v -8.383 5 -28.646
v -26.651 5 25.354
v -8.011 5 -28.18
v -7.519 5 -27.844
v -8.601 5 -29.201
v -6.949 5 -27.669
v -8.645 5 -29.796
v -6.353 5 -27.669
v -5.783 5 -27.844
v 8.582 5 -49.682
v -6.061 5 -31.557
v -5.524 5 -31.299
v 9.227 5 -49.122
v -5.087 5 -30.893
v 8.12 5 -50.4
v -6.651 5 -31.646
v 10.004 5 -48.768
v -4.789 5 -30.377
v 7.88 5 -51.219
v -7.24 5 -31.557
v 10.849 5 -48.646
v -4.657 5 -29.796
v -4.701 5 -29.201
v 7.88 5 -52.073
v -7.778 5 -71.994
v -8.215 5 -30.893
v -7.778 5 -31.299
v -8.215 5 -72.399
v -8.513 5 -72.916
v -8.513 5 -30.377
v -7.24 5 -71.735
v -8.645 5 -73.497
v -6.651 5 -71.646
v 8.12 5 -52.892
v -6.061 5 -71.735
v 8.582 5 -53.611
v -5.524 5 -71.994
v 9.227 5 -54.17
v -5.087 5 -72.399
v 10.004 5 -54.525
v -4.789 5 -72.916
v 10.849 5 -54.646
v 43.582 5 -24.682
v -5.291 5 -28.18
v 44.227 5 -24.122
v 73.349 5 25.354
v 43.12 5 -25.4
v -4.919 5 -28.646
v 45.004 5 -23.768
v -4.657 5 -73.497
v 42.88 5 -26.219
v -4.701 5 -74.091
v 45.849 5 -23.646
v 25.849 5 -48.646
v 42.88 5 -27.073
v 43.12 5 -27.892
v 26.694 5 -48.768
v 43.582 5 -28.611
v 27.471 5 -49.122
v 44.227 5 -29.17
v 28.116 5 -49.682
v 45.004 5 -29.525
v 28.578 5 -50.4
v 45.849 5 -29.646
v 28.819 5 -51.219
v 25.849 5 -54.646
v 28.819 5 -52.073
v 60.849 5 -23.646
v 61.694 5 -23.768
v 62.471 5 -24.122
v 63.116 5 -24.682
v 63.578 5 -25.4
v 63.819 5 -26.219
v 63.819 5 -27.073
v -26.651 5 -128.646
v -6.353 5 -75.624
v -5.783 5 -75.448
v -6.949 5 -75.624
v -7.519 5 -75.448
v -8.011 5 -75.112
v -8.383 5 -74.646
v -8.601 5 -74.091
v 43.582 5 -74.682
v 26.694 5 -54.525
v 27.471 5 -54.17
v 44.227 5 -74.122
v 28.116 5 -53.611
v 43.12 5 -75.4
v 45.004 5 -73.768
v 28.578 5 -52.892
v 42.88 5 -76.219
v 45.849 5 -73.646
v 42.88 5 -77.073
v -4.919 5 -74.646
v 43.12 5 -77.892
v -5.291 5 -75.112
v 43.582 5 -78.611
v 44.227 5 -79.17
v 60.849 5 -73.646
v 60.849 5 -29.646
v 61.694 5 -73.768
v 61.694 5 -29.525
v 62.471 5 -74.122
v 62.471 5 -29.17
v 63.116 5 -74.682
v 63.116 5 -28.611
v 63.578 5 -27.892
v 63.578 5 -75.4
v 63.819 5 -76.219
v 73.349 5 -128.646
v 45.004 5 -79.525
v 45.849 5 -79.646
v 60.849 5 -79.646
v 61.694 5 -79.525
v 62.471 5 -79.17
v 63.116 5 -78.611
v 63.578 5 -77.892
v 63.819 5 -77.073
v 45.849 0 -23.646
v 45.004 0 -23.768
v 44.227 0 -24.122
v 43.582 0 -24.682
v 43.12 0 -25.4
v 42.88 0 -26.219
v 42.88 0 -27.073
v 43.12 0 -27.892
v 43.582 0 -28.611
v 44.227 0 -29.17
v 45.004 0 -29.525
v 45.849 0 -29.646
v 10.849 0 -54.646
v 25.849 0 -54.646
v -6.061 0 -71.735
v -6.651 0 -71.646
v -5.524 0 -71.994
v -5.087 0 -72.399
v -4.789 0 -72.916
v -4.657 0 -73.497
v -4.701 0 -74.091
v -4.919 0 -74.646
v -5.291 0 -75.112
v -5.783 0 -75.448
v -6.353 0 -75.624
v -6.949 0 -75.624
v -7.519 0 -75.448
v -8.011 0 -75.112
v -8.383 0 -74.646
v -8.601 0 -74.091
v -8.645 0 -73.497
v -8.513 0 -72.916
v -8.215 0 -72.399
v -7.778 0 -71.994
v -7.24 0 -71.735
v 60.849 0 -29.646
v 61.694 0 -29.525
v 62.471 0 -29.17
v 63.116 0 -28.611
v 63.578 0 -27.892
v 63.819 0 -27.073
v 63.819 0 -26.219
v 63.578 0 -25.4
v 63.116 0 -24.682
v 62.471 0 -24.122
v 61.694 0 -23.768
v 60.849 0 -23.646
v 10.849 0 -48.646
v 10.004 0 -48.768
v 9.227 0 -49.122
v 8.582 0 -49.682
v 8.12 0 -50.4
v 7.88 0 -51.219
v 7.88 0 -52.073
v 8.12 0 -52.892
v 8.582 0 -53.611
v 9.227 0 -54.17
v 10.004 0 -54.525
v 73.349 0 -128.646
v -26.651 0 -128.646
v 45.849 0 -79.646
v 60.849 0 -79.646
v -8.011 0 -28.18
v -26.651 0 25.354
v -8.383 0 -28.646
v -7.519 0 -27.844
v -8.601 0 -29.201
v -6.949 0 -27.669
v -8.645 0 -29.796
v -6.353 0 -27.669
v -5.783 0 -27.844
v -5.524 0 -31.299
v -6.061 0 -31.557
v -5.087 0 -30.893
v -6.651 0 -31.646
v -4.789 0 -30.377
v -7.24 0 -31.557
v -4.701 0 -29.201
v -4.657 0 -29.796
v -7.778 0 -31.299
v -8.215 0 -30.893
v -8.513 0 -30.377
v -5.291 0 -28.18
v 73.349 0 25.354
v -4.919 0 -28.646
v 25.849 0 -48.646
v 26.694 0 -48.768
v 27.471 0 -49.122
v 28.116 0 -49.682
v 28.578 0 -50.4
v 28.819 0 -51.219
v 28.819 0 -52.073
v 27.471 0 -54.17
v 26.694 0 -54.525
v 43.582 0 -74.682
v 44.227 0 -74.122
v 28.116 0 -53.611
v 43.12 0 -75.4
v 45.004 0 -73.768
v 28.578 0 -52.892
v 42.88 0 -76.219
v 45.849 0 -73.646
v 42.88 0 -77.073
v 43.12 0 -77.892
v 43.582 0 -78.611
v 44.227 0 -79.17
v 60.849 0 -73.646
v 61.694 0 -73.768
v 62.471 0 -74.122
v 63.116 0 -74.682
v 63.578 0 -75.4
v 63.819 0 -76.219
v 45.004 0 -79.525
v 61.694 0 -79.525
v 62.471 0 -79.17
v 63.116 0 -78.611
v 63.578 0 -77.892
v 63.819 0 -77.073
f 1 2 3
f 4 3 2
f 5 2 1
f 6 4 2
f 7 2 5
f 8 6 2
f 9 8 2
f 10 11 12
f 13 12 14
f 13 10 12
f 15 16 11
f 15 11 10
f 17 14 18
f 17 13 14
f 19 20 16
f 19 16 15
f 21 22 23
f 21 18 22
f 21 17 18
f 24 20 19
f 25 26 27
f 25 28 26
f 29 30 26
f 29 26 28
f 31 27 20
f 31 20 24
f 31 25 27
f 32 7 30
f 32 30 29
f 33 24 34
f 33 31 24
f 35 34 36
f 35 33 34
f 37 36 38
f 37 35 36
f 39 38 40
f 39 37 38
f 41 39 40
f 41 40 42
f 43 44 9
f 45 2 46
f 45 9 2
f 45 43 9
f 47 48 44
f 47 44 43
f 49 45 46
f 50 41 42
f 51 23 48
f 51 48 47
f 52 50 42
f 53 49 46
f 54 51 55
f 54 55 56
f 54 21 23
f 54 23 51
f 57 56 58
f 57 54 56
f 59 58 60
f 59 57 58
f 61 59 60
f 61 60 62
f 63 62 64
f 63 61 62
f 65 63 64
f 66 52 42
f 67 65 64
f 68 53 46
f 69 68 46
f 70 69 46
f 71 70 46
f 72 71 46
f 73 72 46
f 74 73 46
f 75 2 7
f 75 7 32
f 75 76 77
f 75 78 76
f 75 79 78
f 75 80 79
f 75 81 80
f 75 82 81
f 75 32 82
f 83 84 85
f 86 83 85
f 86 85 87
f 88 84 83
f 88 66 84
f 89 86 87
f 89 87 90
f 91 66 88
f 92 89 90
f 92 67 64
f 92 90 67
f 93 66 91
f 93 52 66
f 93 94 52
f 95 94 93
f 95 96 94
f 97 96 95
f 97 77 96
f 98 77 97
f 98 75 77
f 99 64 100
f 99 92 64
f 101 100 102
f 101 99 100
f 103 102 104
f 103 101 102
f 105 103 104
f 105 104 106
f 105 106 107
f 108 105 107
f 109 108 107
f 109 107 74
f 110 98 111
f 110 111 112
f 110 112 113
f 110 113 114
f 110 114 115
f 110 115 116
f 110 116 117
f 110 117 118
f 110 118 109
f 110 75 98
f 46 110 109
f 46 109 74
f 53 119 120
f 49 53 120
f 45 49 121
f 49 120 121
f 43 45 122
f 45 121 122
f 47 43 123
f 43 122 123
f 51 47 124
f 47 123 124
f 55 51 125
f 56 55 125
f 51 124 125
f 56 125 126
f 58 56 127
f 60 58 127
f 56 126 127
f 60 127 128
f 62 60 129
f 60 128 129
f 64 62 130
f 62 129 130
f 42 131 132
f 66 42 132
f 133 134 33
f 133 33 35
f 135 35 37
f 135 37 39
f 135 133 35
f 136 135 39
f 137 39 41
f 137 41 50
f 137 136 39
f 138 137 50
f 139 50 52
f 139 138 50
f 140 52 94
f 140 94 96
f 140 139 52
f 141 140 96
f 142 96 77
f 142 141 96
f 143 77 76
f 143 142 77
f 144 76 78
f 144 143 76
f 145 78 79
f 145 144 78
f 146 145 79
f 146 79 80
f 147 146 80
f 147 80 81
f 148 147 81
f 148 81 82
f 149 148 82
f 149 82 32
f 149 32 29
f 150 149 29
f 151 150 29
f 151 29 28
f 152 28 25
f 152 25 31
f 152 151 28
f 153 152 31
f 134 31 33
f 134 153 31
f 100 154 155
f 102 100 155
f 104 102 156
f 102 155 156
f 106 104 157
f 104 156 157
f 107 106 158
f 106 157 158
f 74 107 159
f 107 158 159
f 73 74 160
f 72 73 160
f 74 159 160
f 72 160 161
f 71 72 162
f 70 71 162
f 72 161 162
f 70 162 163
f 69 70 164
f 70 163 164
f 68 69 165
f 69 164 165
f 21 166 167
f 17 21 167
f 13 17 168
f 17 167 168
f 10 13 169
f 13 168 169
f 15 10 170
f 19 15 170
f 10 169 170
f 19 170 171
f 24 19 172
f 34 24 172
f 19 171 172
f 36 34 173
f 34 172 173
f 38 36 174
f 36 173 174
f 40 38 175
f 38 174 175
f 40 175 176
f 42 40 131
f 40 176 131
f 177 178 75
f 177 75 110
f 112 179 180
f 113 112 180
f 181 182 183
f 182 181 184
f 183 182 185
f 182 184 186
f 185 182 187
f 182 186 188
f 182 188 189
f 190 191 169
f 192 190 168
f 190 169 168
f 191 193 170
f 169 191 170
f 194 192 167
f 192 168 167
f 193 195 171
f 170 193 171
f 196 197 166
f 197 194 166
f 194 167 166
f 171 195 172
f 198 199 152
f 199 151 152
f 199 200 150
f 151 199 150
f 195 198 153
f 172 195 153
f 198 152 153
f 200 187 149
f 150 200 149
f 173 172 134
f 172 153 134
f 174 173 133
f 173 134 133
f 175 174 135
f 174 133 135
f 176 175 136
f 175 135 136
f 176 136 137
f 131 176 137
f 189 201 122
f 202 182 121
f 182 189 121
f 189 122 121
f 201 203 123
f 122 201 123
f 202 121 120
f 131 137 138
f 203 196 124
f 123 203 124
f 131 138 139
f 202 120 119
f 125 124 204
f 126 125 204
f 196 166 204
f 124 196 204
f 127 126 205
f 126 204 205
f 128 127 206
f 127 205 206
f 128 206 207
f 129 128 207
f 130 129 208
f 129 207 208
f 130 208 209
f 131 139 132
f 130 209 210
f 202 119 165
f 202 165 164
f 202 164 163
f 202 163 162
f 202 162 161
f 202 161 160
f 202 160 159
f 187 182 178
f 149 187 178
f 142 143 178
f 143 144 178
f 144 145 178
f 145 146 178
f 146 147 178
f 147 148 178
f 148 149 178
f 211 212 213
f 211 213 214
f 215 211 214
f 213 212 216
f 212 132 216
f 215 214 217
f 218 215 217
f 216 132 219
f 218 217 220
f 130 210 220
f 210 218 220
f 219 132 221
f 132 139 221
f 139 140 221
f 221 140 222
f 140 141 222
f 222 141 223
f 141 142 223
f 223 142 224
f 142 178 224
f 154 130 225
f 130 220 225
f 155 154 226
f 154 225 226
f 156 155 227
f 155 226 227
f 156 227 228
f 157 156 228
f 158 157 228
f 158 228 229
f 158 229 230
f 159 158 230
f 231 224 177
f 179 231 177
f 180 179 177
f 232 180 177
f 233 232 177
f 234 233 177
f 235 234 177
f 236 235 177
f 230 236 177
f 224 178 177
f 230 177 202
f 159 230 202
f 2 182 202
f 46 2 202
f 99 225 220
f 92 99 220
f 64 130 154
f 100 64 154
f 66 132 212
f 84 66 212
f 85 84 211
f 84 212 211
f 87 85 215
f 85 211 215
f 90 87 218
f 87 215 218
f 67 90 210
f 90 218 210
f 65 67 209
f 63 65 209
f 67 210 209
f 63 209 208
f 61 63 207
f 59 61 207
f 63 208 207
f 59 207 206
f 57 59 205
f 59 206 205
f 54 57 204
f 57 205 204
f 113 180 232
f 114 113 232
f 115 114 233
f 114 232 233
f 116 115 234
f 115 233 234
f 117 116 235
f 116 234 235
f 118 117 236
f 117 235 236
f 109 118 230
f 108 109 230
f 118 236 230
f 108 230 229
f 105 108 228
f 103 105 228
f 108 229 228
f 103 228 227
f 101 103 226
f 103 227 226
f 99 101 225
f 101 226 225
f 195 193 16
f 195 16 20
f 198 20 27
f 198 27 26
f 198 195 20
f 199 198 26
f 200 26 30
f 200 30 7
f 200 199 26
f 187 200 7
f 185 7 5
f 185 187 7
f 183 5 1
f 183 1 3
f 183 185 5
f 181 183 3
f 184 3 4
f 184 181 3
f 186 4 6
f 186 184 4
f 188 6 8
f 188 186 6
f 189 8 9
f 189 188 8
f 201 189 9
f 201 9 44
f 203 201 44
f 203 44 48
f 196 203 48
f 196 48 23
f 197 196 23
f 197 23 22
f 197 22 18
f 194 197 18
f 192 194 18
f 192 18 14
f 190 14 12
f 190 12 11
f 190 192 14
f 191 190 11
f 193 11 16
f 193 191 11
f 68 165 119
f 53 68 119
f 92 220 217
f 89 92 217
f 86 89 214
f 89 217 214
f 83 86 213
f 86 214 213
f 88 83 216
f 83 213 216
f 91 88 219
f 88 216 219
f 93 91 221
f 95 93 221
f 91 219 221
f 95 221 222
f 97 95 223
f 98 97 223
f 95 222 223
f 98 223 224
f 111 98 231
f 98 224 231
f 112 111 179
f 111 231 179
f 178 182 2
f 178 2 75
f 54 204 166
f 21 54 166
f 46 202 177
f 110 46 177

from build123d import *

# Parameters (mm, degrees)
SKETCH1_W           = 100
SKETCH1_H           = 154
SKETCH1_R           = 2
BOSS_EXTRUDE1_DEPTH = 5


with BuildPart() as part:
    # Sketch1 → Boss-Extrude1 (new body)
    with BuildSketch(Plane(origin=(0, 0, 0), x_dir=(1, 0, 0), z_dir=(0, 1, 0))):
        with Locations((23.349056604, 51.646226415)):
            Rectangle(SKETCH1_W, SKETCH1_H)
        with Locations(Location((-6.650943396, 73.646226415, 0), (0, 0, 270))):
            Circle(SKETCH1_R, mode=Mode.SUBTRACT)
        with Locations(Location((-6.650943396, 29.646226415, 0), (0, 0, 90))):
            Circle(SKETCH1_R, mode=Mode.SUBTRACT)
        with BuildLine():
            Line((45.849056604, 79.646226415), (60.849056604, 79.646226415))
            ThreePointArc((60.849056604, 79.646226415), (63.849056604, 76.646226415), (60.849056604, 73.646226415))
            Line((60.849056604, 73.646226415), (45.849056604, 73.646226415))
            ThreePointArc((45.849056604, 73.646226415), (42.849056604, 76.646226415), (45.849056604, 79.646226415))
        make_face(mode=Mode.SUBTRACT)
        with BuildLine():
            Line((10.849056604, 54.646226415), (25.849056604, 54.646226415))
            ThreePointArc((25.849056604, 54.646226415), (28.849056604, 51.646226415), (25.849056604, 48.646226415))
            Line((25.849056604, 48.646226415), (10.849056604, 48.646226415))
            ThreePointArc((10.849056604, 48.646226415), (7.849056604, 51.646226415), (10.849056604, 54.646226415))
        make_face(mode=Mode.SUBTRACT)
        with BuildLine():
            Line((45.849056604, 29.646226415), (60.849056604, 29.646226415))
            ThreePointArc((60.849056604, 29.646226415), (63.849056604, 26.646226415), (60.849056604, 23.646226415))
            Line((60.849056604, 23.646226415), (45.849056604, 23.646226415))
            ThreePointArc((45.849056604, 23.646226415), (42.849056604, 26.646226415), (45.849056604, 29.646226415))
        make_face(mode=Mode.SUBTRACT)
    extrude(amount=BOSS_EXTRUDE1_DEPTH)


solid = part.part
